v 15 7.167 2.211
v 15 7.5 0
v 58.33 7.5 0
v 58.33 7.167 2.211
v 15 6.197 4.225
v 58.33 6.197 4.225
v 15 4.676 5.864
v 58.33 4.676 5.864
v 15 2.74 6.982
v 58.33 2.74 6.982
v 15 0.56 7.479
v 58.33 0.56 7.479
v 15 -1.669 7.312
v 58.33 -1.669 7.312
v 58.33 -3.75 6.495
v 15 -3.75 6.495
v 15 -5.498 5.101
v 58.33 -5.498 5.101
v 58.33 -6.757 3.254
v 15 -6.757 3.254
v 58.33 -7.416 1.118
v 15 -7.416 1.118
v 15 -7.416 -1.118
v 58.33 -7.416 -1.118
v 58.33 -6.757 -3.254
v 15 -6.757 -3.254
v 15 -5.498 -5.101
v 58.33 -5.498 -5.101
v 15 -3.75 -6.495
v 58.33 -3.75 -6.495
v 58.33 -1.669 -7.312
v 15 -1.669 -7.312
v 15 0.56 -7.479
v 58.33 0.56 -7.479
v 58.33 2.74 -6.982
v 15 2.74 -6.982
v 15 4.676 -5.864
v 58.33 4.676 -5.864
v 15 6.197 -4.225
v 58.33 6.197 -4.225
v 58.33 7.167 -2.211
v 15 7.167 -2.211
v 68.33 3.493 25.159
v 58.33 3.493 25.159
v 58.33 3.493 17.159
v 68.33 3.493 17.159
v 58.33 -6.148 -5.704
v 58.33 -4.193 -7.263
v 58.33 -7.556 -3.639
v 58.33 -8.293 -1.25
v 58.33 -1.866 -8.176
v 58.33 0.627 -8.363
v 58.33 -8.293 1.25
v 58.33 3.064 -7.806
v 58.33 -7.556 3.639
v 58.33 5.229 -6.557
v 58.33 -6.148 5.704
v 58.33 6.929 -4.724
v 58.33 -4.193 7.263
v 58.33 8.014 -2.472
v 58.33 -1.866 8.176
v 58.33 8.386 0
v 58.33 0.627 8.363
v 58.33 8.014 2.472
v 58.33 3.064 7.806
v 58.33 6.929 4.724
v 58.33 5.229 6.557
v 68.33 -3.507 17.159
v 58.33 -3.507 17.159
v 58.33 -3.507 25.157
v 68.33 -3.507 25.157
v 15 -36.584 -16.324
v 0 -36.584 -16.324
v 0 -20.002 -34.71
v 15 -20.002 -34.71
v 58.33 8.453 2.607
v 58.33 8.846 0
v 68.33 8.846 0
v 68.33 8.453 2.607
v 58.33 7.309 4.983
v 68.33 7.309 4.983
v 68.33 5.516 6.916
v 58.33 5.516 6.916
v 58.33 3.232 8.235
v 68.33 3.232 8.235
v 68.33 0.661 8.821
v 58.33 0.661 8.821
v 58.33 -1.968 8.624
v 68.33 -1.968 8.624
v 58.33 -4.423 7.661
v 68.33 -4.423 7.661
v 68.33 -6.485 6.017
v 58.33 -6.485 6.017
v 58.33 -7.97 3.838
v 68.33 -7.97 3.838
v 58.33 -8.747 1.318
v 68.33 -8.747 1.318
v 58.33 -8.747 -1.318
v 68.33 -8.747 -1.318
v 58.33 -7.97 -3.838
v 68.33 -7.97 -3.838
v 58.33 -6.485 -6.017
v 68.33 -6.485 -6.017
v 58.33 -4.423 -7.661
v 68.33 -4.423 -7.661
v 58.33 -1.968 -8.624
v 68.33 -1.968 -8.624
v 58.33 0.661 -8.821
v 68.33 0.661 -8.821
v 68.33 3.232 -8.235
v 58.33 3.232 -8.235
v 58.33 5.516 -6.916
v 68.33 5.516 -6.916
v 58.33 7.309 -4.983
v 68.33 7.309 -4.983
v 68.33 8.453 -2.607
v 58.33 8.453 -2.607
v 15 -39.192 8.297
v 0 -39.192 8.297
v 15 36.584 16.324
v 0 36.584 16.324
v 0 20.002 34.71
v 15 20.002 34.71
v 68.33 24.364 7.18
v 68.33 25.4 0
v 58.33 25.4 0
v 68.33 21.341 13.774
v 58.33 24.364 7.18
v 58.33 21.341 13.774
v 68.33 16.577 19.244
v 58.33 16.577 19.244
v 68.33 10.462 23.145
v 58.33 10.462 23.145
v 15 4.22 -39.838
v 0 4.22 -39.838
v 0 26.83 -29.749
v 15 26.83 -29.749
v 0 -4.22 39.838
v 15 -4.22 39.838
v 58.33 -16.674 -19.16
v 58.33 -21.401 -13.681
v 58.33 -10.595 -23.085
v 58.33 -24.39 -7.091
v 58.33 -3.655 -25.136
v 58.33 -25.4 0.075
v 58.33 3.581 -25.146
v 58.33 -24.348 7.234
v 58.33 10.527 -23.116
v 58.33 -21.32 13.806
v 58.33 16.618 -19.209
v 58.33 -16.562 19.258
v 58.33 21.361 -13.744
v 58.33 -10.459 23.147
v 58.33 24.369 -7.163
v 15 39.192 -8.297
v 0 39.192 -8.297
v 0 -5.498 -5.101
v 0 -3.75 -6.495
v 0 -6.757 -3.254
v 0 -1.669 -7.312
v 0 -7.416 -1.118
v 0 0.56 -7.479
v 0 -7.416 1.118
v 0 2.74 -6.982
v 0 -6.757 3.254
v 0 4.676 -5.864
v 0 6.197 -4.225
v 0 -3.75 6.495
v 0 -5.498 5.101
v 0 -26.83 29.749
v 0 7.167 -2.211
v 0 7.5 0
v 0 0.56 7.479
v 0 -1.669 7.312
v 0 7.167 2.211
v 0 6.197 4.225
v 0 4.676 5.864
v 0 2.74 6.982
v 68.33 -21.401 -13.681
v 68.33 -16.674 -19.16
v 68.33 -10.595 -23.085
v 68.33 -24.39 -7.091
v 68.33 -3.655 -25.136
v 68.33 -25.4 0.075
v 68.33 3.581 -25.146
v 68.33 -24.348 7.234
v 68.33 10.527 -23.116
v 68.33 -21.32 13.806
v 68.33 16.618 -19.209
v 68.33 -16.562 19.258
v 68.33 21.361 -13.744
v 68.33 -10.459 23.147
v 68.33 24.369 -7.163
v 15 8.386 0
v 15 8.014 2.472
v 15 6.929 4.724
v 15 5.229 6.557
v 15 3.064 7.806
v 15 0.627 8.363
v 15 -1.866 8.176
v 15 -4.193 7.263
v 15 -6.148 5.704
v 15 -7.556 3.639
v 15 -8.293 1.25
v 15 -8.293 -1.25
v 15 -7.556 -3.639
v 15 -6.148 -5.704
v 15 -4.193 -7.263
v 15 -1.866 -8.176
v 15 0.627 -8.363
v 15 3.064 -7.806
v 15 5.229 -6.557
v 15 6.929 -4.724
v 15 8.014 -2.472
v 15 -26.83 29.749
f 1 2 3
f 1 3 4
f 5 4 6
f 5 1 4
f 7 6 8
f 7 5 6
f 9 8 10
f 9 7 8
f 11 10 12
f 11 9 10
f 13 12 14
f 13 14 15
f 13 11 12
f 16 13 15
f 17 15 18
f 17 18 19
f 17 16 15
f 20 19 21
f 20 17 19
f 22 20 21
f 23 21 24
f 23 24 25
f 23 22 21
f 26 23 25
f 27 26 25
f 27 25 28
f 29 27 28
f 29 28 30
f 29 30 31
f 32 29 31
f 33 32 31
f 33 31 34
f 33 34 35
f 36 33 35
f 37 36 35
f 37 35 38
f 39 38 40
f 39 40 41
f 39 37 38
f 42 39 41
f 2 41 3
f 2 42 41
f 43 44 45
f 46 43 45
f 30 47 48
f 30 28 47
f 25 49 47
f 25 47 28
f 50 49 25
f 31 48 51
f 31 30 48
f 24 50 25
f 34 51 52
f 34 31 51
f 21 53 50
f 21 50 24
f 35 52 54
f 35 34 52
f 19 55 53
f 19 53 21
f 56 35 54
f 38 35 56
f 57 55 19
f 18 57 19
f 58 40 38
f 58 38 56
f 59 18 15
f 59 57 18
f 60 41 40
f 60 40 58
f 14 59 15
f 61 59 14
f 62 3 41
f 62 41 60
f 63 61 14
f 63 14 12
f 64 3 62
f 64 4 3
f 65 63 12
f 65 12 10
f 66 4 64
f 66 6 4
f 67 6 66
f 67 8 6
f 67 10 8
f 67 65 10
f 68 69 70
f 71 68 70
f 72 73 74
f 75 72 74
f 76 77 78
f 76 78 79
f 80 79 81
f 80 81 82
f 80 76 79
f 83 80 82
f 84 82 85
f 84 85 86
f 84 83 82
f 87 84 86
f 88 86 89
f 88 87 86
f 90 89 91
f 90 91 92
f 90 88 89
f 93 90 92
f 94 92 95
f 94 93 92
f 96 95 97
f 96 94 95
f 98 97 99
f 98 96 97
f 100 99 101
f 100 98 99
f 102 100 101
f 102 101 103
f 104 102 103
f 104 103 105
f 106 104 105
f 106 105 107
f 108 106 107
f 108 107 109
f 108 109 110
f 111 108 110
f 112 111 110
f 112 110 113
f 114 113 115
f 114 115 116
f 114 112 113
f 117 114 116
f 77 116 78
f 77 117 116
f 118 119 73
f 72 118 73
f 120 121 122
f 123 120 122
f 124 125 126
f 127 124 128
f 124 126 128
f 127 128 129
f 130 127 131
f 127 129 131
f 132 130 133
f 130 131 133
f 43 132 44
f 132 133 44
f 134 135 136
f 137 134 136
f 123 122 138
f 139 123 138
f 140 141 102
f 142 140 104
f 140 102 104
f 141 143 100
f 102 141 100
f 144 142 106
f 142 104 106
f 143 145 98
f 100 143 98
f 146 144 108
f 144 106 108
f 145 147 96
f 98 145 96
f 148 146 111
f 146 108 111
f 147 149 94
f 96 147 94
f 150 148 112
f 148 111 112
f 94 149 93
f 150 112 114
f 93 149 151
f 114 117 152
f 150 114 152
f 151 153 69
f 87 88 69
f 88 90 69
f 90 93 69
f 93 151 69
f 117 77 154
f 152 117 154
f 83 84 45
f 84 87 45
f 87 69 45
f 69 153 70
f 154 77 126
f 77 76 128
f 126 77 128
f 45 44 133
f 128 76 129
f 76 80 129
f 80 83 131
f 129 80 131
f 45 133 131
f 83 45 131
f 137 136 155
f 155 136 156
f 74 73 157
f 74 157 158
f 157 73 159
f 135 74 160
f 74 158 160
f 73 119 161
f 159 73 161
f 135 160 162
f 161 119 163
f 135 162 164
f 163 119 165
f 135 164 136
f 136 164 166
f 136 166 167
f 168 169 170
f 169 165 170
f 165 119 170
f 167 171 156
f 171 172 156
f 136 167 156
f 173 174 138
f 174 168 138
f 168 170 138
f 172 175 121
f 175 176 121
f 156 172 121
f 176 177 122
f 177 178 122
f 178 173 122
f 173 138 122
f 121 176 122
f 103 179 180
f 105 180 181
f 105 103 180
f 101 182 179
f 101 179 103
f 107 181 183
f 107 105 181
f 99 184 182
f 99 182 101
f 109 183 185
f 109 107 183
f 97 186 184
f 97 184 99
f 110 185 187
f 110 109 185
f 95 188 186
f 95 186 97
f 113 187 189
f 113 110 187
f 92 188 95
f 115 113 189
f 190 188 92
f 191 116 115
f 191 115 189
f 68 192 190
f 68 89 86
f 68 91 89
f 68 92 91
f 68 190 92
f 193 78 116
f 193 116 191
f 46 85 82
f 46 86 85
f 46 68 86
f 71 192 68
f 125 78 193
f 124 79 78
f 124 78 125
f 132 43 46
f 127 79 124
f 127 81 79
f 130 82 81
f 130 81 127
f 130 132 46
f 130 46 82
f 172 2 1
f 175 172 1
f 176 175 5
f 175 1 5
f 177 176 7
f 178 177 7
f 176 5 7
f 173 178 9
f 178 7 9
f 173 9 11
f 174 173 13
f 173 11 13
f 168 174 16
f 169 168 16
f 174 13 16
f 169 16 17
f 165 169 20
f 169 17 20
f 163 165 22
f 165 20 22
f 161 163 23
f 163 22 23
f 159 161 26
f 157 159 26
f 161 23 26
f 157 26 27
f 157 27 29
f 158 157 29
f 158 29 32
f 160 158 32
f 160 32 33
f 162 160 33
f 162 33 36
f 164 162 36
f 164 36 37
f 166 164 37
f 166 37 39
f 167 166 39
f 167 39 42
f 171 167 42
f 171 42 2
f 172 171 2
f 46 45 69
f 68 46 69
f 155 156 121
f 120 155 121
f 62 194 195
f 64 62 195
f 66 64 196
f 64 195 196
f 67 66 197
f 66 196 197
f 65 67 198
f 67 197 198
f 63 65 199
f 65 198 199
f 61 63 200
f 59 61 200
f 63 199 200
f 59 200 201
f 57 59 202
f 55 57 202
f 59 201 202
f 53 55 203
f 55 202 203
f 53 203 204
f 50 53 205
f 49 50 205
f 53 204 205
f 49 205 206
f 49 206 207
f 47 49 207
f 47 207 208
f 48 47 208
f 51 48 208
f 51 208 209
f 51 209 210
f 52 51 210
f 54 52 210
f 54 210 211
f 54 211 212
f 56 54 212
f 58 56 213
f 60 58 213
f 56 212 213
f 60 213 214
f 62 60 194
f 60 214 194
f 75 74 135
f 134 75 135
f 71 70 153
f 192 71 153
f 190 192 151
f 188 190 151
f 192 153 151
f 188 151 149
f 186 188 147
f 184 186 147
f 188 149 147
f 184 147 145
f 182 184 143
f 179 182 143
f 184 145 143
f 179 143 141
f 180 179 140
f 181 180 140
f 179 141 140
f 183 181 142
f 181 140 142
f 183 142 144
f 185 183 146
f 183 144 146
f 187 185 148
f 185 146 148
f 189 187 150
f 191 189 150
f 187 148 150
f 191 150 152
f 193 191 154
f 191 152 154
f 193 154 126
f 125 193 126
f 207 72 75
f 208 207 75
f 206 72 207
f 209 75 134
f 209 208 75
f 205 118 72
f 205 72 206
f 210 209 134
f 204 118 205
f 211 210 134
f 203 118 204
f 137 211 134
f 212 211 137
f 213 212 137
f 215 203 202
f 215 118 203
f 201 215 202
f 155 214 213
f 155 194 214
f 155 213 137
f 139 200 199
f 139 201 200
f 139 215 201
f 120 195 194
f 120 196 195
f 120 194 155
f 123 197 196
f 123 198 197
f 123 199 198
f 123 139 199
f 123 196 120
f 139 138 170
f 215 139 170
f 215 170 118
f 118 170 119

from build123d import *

# Parameters (mm, degrees)
F1_DEPTH = 15
F2_R     = 7.5
F3_DEPTH = 25.4
F2_R_2   = 8.386183
F4_DEPTH = 43.330219
F5_R     = 8.846213
F6_DEPTH = 10


with BuildPart() as f1:
    # F0 (on Right) → F1 (new body)
    with BuildSketch(Plane.YZ):
        Polygon((26.829948, -29.749192), (39.19202, -8.297354), (36.584073, 16.323791), (20.002253, 34.709803), (-4.219748, 39.83785), (-26.829948, 29.749192), (-39.19202, 8.297354), (-36.584073, -16.323791), (-20.002253, -34.709803), (4.219748, -39.83785), align=None)
    extrude(amount=F1_DEPTH)

    # F2 (on face) → F3 (cut)
    with BuildSketch(Plane.YZ.offset(15)):
        Circle(F2_R)
    extrude(amount=-F3_DEPTH, mode=Mode.SUBTRACT)

    # F2 (on face) → F4 (join)
    with BuildSketch(Plane.YZ.offset(15)):
        Circle(F2_R_2)
        Circle(F2_R, mode=Mode.SUBTRACT)
    extrude(amount=F4_DEPTH)


with BuildPart() as f6:
    # F5 (on face) → F6 (new body)
    with BuildSketch(Plane.YZ.offset(58.330219)):
        with BuildLine():
            ThreePointArc((-3.507358, 25.156678), (-16.674428, -19.160466), (25.4, 0))
            ThreePointArc((25.4, 0), (19.155588, 16.680031), (3.492642, 25.158725))
            Line((3.492642, 25.158725), (3.492642, 17.158725))
            Line((3.492642, 17.158725), (-3.507358, 17.158725))
            Line((-3.507358, 17.158725), (-3.507358, 25.156678))
        make_face()
        Circle(F5_R, mode=Mode.SUBTRACT)
    extrude(amount=F6_DEPTH)


solid = Compound([f1.part, f6.part])
